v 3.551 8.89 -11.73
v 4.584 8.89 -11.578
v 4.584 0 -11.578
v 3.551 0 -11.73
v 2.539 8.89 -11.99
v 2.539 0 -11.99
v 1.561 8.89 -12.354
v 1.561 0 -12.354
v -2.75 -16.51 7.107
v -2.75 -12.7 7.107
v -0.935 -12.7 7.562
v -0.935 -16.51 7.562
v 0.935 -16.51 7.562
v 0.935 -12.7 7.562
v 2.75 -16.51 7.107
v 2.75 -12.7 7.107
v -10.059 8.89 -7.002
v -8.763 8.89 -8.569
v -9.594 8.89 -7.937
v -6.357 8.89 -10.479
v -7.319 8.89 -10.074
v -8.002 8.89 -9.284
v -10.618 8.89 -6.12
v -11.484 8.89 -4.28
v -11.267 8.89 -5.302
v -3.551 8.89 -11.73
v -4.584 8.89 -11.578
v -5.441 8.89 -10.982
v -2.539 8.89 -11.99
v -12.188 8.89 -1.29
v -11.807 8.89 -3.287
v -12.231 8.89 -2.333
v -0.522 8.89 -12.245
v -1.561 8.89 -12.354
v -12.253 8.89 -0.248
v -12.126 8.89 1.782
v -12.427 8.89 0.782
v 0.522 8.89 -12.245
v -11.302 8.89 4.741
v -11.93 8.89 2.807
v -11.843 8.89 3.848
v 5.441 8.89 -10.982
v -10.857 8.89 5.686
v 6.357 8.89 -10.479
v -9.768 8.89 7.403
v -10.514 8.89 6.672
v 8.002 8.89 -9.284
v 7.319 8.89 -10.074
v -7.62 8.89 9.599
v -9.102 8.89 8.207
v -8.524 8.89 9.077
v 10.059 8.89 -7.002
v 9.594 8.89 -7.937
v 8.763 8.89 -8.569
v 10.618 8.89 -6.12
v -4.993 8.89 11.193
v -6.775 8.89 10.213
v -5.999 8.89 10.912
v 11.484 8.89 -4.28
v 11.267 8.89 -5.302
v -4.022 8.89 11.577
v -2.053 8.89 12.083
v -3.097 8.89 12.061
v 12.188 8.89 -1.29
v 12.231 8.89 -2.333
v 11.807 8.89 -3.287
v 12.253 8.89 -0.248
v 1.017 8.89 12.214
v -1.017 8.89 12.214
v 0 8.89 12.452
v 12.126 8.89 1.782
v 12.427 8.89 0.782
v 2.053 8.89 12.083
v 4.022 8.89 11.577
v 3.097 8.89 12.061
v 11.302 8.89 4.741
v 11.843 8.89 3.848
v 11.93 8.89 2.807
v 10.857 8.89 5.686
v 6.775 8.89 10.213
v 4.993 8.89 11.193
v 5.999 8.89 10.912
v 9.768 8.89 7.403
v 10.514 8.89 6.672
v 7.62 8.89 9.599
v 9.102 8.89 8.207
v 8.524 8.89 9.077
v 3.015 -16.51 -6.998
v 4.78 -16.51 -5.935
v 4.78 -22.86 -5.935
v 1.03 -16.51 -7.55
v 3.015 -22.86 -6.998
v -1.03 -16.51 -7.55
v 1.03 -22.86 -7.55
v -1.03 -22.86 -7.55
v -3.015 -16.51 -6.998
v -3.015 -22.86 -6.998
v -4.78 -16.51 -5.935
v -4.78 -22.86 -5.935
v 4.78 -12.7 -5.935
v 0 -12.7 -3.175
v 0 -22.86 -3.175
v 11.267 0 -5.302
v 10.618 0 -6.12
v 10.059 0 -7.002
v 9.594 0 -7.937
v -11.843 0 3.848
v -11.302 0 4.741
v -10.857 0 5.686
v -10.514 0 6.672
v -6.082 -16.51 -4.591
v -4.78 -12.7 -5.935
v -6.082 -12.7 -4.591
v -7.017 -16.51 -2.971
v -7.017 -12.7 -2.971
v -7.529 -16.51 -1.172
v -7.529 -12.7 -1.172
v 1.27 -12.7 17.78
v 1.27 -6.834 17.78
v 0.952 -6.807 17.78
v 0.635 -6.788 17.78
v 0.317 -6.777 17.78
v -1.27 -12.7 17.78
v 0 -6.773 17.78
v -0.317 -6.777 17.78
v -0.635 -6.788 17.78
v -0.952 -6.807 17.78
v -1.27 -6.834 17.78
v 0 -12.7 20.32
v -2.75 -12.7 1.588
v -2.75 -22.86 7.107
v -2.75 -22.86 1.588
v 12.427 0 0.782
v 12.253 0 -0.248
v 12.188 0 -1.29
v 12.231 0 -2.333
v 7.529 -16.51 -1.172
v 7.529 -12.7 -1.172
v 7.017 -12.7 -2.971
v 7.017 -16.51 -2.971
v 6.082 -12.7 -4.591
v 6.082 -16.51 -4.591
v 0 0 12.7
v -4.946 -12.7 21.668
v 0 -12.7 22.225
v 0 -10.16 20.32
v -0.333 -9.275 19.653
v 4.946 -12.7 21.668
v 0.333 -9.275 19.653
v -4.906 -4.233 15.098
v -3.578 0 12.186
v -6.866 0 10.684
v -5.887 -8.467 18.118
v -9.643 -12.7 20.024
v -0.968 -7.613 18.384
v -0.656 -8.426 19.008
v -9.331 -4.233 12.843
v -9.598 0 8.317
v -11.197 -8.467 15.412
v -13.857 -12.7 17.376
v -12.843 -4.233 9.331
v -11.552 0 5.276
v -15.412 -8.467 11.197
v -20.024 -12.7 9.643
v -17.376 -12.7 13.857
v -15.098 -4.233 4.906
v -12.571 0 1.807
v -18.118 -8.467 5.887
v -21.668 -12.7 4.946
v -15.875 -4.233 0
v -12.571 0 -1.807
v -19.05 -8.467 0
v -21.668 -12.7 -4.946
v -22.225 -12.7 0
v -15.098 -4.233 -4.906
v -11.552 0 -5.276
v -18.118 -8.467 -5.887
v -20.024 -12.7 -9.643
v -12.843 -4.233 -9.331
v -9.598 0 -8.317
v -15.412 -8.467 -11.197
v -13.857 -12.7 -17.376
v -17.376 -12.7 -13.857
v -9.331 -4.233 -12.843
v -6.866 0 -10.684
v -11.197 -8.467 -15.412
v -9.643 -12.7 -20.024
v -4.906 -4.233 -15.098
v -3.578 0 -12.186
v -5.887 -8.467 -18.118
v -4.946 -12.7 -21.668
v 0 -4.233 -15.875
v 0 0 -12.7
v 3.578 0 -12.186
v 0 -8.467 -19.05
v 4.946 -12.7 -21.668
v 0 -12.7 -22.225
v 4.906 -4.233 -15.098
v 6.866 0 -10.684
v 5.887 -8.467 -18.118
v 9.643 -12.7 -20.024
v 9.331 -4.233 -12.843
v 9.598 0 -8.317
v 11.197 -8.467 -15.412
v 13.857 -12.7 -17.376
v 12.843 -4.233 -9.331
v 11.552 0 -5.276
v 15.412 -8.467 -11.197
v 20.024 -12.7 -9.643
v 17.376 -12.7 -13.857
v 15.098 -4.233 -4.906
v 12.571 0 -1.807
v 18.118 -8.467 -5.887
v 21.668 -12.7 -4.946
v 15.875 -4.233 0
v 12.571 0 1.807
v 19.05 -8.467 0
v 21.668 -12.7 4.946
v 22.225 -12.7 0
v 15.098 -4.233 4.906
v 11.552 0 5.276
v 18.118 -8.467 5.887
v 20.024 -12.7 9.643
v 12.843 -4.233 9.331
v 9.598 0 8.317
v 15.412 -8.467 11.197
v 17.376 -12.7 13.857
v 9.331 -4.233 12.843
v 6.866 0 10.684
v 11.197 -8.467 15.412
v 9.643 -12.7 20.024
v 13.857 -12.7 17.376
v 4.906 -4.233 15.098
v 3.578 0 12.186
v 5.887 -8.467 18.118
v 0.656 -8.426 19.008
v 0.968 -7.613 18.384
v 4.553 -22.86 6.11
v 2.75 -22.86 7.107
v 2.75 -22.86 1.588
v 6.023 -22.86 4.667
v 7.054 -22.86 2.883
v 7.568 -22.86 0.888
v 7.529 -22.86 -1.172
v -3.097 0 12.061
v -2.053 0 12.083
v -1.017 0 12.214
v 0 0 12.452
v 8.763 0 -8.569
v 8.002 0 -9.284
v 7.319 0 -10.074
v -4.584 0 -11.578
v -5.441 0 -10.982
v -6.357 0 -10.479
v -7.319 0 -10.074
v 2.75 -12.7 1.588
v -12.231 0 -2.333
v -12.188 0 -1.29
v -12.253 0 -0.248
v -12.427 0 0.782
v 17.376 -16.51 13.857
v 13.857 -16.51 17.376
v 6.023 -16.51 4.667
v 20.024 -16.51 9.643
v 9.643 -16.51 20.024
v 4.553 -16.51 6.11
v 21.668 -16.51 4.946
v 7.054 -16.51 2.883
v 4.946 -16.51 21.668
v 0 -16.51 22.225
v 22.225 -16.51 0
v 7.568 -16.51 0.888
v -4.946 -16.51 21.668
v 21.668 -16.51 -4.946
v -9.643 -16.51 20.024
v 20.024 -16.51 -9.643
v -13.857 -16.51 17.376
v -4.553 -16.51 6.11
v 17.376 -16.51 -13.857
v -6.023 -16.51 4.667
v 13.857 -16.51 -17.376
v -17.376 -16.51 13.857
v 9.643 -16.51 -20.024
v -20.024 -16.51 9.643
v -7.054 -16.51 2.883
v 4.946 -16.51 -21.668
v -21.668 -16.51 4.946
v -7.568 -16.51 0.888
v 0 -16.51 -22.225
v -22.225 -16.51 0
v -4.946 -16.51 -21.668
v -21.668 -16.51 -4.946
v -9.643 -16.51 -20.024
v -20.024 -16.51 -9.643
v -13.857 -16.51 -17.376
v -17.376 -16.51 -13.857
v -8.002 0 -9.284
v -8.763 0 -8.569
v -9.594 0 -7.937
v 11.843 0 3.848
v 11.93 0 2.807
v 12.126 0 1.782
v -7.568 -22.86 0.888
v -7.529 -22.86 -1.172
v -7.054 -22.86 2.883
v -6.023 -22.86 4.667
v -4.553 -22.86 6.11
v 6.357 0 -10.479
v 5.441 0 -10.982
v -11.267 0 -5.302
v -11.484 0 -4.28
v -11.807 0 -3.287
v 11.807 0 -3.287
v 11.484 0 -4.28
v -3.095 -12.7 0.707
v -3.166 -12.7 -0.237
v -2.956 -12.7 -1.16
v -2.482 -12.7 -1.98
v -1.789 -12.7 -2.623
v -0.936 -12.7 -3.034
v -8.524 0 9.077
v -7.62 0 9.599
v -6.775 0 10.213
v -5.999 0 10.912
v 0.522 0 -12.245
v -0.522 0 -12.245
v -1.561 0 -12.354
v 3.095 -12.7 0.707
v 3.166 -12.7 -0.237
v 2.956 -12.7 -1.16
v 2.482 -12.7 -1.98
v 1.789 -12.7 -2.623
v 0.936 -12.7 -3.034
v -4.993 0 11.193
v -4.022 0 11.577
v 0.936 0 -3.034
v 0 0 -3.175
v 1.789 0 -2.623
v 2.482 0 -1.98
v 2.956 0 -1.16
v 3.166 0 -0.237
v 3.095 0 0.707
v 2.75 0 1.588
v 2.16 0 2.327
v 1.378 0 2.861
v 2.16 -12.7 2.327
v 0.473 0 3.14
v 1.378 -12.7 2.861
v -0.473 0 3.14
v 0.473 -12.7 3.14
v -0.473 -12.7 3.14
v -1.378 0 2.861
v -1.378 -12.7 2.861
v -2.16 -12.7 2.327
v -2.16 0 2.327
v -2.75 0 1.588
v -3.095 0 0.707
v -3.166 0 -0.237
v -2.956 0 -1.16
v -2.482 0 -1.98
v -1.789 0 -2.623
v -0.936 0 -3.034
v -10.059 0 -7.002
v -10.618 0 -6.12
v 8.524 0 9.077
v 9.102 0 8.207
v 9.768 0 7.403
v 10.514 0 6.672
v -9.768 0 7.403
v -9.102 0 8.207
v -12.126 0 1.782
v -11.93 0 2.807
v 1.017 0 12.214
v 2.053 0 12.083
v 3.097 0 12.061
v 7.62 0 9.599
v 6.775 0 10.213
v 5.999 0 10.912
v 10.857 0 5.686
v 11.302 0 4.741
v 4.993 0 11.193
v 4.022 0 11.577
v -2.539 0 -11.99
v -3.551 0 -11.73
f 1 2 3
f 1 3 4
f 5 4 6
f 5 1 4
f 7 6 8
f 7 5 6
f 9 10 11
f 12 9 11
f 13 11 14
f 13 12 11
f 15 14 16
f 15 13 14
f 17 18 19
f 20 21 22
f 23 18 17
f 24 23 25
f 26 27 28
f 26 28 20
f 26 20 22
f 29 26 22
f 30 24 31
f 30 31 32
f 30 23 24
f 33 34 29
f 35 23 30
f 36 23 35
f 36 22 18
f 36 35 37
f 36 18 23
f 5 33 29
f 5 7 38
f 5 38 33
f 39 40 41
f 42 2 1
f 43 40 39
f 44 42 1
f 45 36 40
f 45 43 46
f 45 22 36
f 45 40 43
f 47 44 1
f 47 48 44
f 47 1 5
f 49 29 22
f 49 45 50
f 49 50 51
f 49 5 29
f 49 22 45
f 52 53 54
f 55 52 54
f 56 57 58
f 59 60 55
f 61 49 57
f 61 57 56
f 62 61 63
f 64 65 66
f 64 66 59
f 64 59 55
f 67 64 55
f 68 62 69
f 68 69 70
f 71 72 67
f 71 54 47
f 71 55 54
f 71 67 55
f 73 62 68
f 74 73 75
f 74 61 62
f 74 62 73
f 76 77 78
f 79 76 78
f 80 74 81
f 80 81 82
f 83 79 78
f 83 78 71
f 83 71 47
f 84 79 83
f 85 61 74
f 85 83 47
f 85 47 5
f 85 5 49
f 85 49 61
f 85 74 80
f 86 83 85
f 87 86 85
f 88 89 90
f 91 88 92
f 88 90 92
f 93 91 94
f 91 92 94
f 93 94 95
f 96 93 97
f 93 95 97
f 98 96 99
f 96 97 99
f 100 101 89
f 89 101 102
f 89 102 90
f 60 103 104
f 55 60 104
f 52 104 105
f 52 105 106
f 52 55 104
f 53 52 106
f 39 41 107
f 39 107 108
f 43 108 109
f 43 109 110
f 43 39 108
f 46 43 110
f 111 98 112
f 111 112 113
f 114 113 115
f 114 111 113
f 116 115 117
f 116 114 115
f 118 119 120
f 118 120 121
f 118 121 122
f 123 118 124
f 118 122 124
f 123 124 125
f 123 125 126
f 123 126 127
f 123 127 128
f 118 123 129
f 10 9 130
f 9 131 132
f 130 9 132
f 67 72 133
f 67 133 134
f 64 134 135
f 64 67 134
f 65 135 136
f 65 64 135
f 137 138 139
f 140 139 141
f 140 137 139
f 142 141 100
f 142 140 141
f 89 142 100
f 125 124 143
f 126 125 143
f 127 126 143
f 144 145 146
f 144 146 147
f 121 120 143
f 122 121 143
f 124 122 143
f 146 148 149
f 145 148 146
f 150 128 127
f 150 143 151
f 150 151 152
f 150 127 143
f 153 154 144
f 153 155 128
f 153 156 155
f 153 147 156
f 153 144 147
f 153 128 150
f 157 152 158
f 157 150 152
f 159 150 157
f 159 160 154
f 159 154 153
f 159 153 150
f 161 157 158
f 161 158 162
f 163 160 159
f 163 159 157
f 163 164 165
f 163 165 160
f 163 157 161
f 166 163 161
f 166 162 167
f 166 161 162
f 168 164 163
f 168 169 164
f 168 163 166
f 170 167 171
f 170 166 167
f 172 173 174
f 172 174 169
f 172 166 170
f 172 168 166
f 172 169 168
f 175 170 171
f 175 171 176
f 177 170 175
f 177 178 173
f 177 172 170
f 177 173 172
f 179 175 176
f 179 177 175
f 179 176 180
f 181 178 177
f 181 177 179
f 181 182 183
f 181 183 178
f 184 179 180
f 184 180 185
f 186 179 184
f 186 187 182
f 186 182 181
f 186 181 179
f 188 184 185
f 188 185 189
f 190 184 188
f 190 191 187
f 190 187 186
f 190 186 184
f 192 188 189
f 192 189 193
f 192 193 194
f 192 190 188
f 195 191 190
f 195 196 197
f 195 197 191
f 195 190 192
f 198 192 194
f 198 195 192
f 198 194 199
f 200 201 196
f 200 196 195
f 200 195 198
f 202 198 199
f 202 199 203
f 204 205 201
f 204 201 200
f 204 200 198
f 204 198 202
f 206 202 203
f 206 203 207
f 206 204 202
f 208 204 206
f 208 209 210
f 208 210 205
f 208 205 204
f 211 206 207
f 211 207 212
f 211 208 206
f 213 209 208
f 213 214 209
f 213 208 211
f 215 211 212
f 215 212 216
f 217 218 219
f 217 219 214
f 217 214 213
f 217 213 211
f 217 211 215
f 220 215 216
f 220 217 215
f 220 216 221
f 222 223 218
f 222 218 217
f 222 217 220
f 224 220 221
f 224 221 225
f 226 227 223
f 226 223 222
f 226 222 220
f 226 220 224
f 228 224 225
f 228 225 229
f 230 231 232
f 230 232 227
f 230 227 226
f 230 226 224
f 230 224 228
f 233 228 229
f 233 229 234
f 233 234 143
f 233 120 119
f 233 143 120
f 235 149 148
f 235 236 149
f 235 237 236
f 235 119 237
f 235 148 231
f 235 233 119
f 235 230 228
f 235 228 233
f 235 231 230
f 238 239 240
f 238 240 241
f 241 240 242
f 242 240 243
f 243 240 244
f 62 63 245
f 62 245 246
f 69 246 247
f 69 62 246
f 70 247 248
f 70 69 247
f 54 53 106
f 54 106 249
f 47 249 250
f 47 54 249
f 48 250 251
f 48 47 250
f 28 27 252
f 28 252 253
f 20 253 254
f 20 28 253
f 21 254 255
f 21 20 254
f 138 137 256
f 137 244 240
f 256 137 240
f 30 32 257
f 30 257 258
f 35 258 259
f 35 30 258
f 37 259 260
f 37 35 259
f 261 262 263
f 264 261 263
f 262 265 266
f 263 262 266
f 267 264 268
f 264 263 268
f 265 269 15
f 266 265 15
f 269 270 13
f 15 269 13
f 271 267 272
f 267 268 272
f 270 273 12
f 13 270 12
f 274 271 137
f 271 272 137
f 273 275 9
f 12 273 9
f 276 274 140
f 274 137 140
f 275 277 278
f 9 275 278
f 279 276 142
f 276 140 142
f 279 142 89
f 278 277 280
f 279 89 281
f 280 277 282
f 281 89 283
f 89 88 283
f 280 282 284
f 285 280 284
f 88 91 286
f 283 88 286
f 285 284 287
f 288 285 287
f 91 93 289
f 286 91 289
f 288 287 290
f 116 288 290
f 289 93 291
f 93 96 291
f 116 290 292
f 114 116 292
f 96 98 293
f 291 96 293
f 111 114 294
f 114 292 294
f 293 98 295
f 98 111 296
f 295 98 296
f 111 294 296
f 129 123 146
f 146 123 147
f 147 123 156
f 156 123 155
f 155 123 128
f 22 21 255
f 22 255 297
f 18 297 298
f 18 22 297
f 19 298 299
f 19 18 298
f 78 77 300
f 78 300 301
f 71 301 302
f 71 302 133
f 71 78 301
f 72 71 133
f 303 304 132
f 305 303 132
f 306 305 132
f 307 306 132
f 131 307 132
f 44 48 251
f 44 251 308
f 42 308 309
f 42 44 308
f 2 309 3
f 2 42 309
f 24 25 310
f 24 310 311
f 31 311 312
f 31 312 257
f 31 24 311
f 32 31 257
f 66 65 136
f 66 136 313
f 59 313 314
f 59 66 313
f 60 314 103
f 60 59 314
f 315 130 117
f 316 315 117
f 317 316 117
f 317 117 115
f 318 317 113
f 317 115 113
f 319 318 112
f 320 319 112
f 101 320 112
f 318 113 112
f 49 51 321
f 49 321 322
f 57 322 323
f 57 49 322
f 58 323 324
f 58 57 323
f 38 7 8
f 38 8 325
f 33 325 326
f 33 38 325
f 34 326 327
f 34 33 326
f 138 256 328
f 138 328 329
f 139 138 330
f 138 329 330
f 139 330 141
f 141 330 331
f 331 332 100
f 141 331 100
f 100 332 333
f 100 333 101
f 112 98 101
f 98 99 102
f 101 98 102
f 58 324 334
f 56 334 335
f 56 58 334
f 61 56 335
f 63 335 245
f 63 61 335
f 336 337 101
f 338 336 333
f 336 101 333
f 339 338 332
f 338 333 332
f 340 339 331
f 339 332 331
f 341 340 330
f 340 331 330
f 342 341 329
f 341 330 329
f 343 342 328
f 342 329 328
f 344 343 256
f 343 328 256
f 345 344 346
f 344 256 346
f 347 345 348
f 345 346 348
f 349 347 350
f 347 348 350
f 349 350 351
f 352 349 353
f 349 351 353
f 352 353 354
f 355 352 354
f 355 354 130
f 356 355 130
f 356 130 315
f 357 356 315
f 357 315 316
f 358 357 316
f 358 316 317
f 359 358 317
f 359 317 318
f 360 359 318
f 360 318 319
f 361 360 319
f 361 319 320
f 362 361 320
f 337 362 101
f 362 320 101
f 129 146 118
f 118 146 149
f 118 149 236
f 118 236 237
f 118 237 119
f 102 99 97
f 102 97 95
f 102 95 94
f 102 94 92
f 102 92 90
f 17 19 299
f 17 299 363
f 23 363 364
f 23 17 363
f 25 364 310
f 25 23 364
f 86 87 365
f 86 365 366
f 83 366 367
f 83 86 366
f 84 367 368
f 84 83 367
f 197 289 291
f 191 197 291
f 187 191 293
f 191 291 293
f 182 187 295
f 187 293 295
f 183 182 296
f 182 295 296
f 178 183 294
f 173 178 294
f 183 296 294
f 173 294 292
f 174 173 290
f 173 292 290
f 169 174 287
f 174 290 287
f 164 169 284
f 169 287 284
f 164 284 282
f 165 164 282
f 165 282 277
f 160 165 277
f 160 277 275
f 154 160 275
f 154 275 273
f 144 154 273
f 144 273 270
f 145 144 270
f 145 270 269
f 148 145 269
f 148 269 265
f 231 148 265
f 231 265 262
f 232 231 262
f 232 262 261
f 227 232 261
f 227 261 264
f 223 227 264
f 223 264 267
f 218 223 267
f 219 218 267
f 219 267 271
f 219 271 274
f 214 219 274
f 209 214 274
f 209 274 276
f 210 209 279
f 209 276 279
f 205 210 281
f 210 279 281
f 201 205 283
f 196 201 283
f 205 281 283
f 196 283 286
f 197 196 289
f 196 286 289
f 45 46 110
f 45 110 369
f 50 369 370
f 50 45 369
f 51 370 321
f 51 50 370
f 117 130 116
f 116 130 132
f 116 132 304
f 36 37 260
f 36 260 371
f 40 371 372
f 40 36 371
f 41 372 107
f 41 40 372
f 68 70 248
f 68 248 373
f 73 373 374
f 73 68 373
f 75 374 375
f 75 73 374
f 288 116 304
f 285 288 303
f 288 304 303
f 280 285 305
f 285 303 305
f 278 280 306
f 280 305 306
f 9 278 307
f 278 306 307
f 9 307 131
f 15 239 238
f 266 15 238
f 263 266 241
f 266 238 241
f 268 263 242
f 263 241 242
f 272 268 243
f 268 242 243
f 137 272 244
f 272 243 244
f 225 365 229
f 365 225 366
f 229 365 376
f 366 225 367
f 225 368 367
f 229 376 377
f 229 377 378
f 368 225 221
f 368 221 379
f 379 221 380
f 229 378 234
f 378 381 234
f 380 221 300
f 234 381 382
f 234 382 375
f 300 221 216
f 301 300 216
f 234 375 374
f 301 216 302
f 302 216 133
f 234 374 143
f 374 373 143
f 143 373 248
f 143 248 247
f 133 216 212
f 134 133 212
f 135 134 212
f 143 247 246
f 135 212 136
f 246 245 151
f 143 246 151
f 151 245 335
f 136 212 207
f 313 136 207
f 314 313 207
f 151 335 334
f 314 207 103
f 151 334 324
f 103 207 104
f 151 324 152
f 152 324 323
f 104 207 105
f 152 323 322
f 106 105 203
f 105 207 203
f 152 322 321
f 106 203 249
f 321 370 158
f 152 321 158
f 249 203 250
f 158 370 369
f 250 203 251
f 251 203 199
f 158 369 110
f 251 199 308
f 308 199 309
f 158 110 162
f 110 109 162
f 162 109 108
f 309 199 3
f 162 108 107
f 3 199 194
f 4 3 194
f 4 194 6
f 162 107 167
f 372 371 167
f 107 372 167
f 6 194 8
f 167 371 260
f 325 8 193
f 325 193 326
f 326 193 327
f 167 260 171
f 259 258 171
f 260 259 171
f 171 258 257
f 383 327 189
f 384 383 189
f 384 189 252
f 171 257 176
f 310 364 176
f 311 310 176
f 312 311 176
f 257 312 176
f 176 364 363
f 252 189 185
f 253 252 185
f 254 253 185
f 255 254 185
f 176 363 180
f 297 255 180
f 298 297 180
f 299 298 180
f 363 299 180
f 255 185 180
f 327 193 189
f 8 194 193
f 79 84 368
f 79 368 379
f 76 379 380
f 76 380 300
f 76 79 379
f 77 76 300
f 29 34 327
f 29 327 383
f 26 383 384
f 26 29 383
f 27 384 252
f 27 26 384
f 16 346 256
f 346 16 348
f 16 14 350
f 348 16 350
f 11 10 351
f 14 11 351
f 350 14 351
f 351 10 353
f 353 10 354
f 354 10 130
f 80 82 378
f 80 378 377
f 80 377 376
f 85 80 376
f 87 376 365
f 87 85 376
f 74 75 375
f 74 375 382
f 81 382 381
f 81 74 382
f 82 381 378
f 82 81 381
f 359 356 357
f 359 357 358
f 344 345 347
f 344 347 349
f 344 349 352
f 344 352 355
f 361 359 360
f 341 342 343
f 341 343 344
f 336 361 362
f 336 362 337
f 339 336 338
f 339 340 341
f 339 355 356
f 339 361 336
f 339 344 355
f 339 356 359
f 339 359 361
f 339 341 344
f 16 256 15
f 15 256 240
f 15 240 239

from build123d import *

# Parameters (mm, degrees)
SKETCH1_R                = 12.7
BOSS_EXTRUDE1_DEPTH      = 8.89
SKETCH2_R                = 22.225
BOSS_EXTRUDE3_DEPTH      = 3.81
SKETCH4_R                = 7.62
CUT_EXTRUDE2_DEPTH       = 3.81
BOSS_EXTRUDE4_DEPTH      = 3.81
BOSS_EXTRUDE4_DEPTH_BACK = 6.35
SKETCH7_R                = 3.175
CUT_EXTRUDE3_DEPTH       = 12.7
CUT_EXTRUDE4_DEPTH       = 12.7
CUT_EXTRUDE_THIN2_DEPTH  = 8.89


with BuildPart() as part:
    # Sketch1 → Boss-Extrude1 (new body)
    with BuildSketch(Plane(origin=(0, 0, 0), x_dir=(1, 0, 0), z_dir=(0, 1, 0))):
        with Locations(Location((0, 0, 0), (0, 0, 270))):
            Circle(SKETCH1_R)
    extrude(amount=BOSS_EXTRUDE1_DEPTH)



with BuildPart() as body_2:
    # Sketch2 → Boss-Extrude3 (new body)
    with BuildSketch(Plane(origin=(0, -16.51, 0), x_dir=(1, 0, 0), z_dir=(0, 1, 0))):
        with Locations(Location((0, 0, 0), (0, 0, 90))):
            Circle(SKETCH2_R)
    extrude(amount=BOSS_EXTRUDE3_DEPTH)


with BuildPart() as part_1:
    add(part.part)

    add(body_2.part)  # loft2 joins it to this body
    # loft up to a face of the part (loft2)
    loft([Face(Wire([part_1.edges().sort_by_distance((-9.257901568, 0, -8.693748245))[0]])), Face(Wire([part_1.edges().sort_by_distance((-16.201327744, -12.7, 15.214059429))[0]]))])

    # Sketch4 → Cut-Extrude2 (cut)
    with BuildSketch(Plane(origin=(0, -16.51, 0), x_dir=(1, 0, 0), z_dir=(0, 1, 0))):
        with Locations(Location((0, 0, 0), (0, 0, 90))):
            Circle(SKETCH4_R)
    extrude(amount=CUT_EXTRUDE2_DEPTH, mode=Mode.SUBTRACT)

    # Sketch3 → Boss-Extrude4 (add, two sides: drawn at the far end of the back side and taken through both)
    with BuildSketch(Plane(origin=(0, -16.51, 0), x_dir=(1, 0, 0), z_dir=(0, 1, 0)).offset(-BOSS_EXTRUDE4_DEPTH_BACK)):
        with BuildLine():
            Line((0, 3.175), (4.779691024, 5.934555899))
            ThreePointArc((4.779691024, 5.934555899), (0, 7.62), (-4.779691024, 5.934555899))
            Line((-4.779691024, 5.934555899), (0, 3.175))
        make_face()
        with BuildLine():
            Line((2.749630657, -1.5875), (2.749630657, -7.106611798))
            ThreePointArc((2.749630657, -7.106611798), (6.599113577, -3.81), (7.529321681, 1.172055899))
            Line((7.529321681, 1.172055899), (2.749630657, -1.5875))
        make_face()
        with BuildLine():
            Line((-2.749630657, -1.5875), (-7.529321681, 1.172055899))
            ThreePointArc((-7.529321681, 1.172055899), (-6.599113577, -3.81), (-2.749630657, -7.106611798))
            Line((-2.749630657, -7.106611798), (-2.749630657, -1.5875))
        make_face()
    extrude(amount=BOSS_EXTRUDE4_DEPTH + BOSS_EXTRUDE4_DEPTH_BACK)

    # Sketch7 → Cut-Extrude3 (cut)
    with BuildSketch(Plane.XZ.offset(12.7)):
        with Locations(Location((0, 0, 0), (0, 0, 270))):
            Circle(SKETCH7_R)
    extrude(amount=-CUT_EXTRUDE3_DEPTH, mode=Mode.SUBTRACT)

    # Sketch9 → Cut-Extrude4 (cut)
    with BuildSketch(Plane(origin=(0, 0, 0), x_dir=(1, 0, 0), z_dir=(0, 1, 0))):
        Polygon((0, -20.32), (1.27, -17.78), (-1.27, -17.78), align=None)
    extrude(amount=-CUT_EXTRUDE4_DEPTH, mode=Mode.SUBTRACT)

    # Sketch10 → Cut-Extrude-Thin2 (cut)
    with BuildSketch(Plane(origin=(0, 8.89, 0), x_dir=(1, 0, 0), z_dir=(0, 1, 0))):
        with BuildLine():
            ThreePointArc((2.277411846, 12.494134435), (0, 12.231184444), (-2.277411846, 12.494134435))
            Line((-2.277411846, 12.494134435), (-1.698591269, 14.967303806))
            ThreePointArc((-1.698591269, 14.967303806), (0, 14.771184444), (1.698591269, 14.967303806))
            Line((1.698591269, 14.967303806), (2.277411846, 12.494134435))
        make_face()
        with BuildLine():
            ThreePointArc((5.313027648, 11.535238932), (3.041771879, 11.846919293), (0.901302118, 12.667977522))
            Line((0.901302118, 12.667977522), (2.076990194, 14.919500905))
            ThreePointArc((2.076990194, 14.919500905), (3.673444193, 14.307120523), (5.367443996, 14.074655963))
            Line((5.367443996, 14.074655963), (5.313027648, 11.535238932))
        make_face()
        with BuildLine():
            ThreePointArc((8.014806383, 9.851541942), (5.892418045, 10.718268633), (4.023383955, 12.045844991))
            Line((4.023383955, 12.045844991), (5.722066724, 13.934250892))
            ThreePointArc((5.722066724, 13.934250892), (7.116072377, 12.944087601), (8.699040476, 12.297645723))
            Line((8.699040476, 12.297645723), (8.014806383, 9.851541942))
        make_face()
        with BuildLine():
            ThreePointArc((10.212985356, 7.548836342), (8.372821913, 8.916149736), (6.892661781, 10.666827718))
            Line((6.892661781, 10.666827718), (9.007604758, 12.073460649))
            ThreePointArc((9.007604758, 12.073460649), (10.111571563, 10.76773005), (11.48404425, 9.747929175))
            Line((11.48404425, 9.747929175), (10.212985356, 7.548836342))
        make_face()
        with BuildLine():
            ThreePointArc((11.769444899, 4.771809591), (10.327130588, 6.55379636), (9.328848318, 8.61757443))
            Line((9.328848318, 8.61757443), (11.727161858, 9.454050471))
            ThreePointArc((11.727161858, 9.454050471), (12.471723519, 7.914796419), (13.547463289, 6.585714386))
            Line((13.547463289, 6.585714386), (11.769444899, 4.771809591))
        make_face()
        with BuildLine():
            ThreePointArc((12.586386934, 1.694952494), (11.632547668, 3.779643855), (11.178869006, 6.026847247))
            Line((11.178869006, 6.026847247), (13.709858248, 6.240607531))
            ThreePointArc((13.709858248, 6.240607531), (14.048231219, 4.56454702), (14.759645385, 3.009694941))
            Line((14.759645385, 3.009694941), (12.586386934, 1.694952494))
        make_face()
        with BuildLine():
            ThreePointArc((12.612479988, -1.488404702), (12.207048996, 0.768002426), (12.326480242, 3.057431087))
            Line((12.326480242, 3.057431087), (14.831113823, 2.635044269))
            ThreePointArc((14.831113823, 2.635044269), (14.742036886, 0.927490345), (15.04442468, -0.755434705))
            Line((15.04442468, -0.755434705), (12.612479988, -1.488404702))
        make_face()
        with BuildLine():
            ThreePointArc((11.846084539, -4.578239956), (12.014536541, -2.29189542), (12.69957339, -0.104094714))
            Line((12.69957339, -0.104094714), (15.020475972, -1.136088515))
            ThreePointArc((15.020475972, -1.136088515), (14.509546158, -2.767843959), (14.383907442, -4.473097611))
            Line((14.383907442, -4.473097611), (11.846084539, -4.578239956))
        make_face()
        with BuildLine():
            ThreePointArc((10.335356031, -7.380407557), (11.067106569, -5.207785048), (12.274705637, -3.25907986))
            Line((12.274705637, -3.25907986), (14.266046374, -4.83583668))
            ThreePointArc((14.266046374, -4.83583668), (13.365367282, -6.289264448), (12.819596399, -7.909699343))
            Line((12.819596399, -7.909699343), (10.335356031, -7.380407557))
        make_face()
        with BuildLine():
            ThreePointArc((8.175219094, -9.718837007), (9.424289589, -7.796450388), (11.078572985, -6.209285033))
            Line((11.078572985, -6.209285033), (12.615228615, -8.231731441))
            ThreePointArc((12.615228615, -8.231731441), (11.381393226, -9.415507322), (10.449782968, -10.849305575))
            Line((10.449782968, -10.849305575), (8.175219094, -9.718837007))
        make_face()
        with BuildLine():
            ThreePointArc((5.501403074, -11.446596185), (7.189309834, -9.895236077), (9.186332848, -8.769337991))
            Line((9.186332848, -8.769337991), (10.171749647, -11.110396242))
            ThreePointArc((10.171749647, -11.110396242), (8.682284375, -11.950139243), (7.423371241, -13.107210037))
            Line((7.423371241, -13.107210037), (5.501403074, -11.446596185))
        make_face()
        with BuildLine():
            ThreePointArc((2.481913667, -12.455123626), (4.502599302, -11.372267691), (6.716881634, -10.778381192))
            Line((6.716881634, -10.778381192), (7.08914224, -13.290953985))
            ThreePointArc((7.08914224, -13.290953985), (5.437635666, -13.733899965), (3.930521798, -14.541540287))
            Line((3.930521798, -14.541540287), (2.481913667, -12.455123626))
        make_face()
        with BuildLine():
            ThreePointArc((-0.693523504, -12.681049844), (1.532973897, -12.134737902), (3.825384043, -12.110179062))
            Line((3.825384043, -12.110179062), (3.561097953, -14.636392209))
            ThreePointArc((3.561097953, -14.636392209), (1.85132031, -14.654709243), (0.190703214, -15.062172082))
            Line((0.190703214, -15.062172082), (-0.693523504, -12.681049844))
        make_face()
        with BuildLine():
            ThreePointArc((-3.825384043, -12.110179062), (-1.532973897, -12.134737902), (0.693523504, -12.681049844))
            Line((0.693523504, -12.681049844), (-0.190703214, -15.062172082))
            ThreePointArc((-0.190703214, -15.062172082), (-1.85132031, -14.654709243), (-3.561097953, -14.636392209))
            Line((-3.561097953, -14.636392209), (-3.825384043, -12.110179062))
        make_face()
        with BuildLine():
            ThreePointArc((-6.716881634, -10.778381192), (-4.502599302, -11.372267691), (-2.481913667, -12.455123626))
            Line((-2.481913667, -12.455123626), (-3.930521798, -14.541540287))
            ThreePointArc((-3.930521798, -14.541540287), (-5.437635666, -13.733899965), (-7.08914224, -13.290953985))
            Line((-7.08914224, -13.290953985), (-6.716881634, -10.778381192))
        make_face()
        with BuildLine():
            ThreePointArc((-9.186332848, -8.769337991), (-7.189309834, -9.895236077), (-5.501403074, -11.446596185))
            Line((-5.501403074, -11.446596185), (-7.423371241, -13.107210037))
            ThreePointArc((-7.423371241, -13.107210037), (-8.682284375, -11.950139243), (-10.171749647, -11.110396242))
            Line((-10.171749647, -11.110396242), (-9.186332848, -8.769337991))
        make_face()
        with BuildLine():
            ThreePointArc((-11.078572985, -6.209285033), (-9.424289589, -7.796450388), (-8.175219094, -9.718837007))
            Line((-8.175219094, -9.718837007), (-10.449782968, -10.849305575))
            ThreePointArc((-10.449782968, -10.849305575), (-11.381393226, -9.415507322), (-12.615228615, -8.231731441))
            Line((-12.615228615, -8.231731441), (-11.078572985, -6.209285033))
        make_face()
        with BuildLine():
            ThreePointArc((-12.274705637, -3.25907986), (-11.067106569, -5.207785048), (-10.335356031, -7.380407557))
            Line((-10.335356031, -7.380407557), (-12.819596399, -7.909699343))
            ThreePointArc((-12.819596399, -7.909699343), (-13.365367282, -6.289264448), (-14.266046374, -4.83583668))
            Line((-14.266046374, -4.83583668), (-12.274705637, -3.25907986))
        make_face()
        with BuildLine():
            ThreePointArc((-12.69957339, -0.104094714), (-12.014536541, -2.29189542), (-11.846084539, -4.578239956))
            Line((-11.846084539, -4.578239956), (-14.383907442, -4.473097611))
            ThreePointArc((-14.383907442, -4.473097611), (-14.509546158, -2.767843959), (-15.020475972, -1.136088515))
            Line((-15.020475972, -1.136088515), (-12.69957339, -0.104094714))
        make_face()
        with BuildLine():
            ThreePointArc((-12.326480242, 3.057431087), (-12.207048996, 0.768002426), (-12.612479988, -1.488404702))
            Line((-12.612479988, -1.488404702), (-15.04442468, -0.755434705))
            ThreePointArc((-15.04442468, -0.755434705), (-14.742036886, 0.927490345), (-14.831113823, 2.635044269))
            Line((-14.831113823, 2.635044269), (-12.326480242, 3.057431087))
        make_face()
        with BuildLine():
            ThreePointArc((-11.178869006, 6.026847247), (-11.632547668, 3.779643855), (-12.586386934, 1.694952494))
            Line((-12.586386934, 1.694952494), (-14.759645385, 3.009694941))
            ThreePointArc((-14.759645385, 3.009694941), (-14.048231219, 4.56454702), (-13.709858248, 6.240607531))
            Line((-13.709858248, 6.240607531), (-11.178869006, 6.026847247))
        make_face()
        with BuildLine():
            ThreePointArc((-9.328848318, 8.61757443), (-10.327130588, 6.55379636), (-11.769444899, 4.771809591))
            Line((-11.769444899, 4.771809591), (-13.547463289, 6.585714386))
            ThreePointArc((-13.547463289, 6.585714386), (-12.471723519, 7.914796419), (-11.727161858, 9.454050471))
            Line((-11.727161858, 9.454050471), (-9.328848318, 8.61757443))
        make_face()
        with BuildLine():
            ThreePointArc((-6.892661781, 10.666827718), (-8.372821913, 8.916149736), (-10.212985356, 7.548836342))
            Line((-10.212985356, 7.548836342), (-11.48404425, 9.747929175))
            ThreePointArc((-11.48404425, 9.747929175), (-10.111571563, 10.76773005), (-9.007604758, 12.073460649))
            Line((-9.007604758, 12.073460649), (-6.892661781, 10.666827718))
        make_face()
        with BuildLine():
            ThreePointArc((-4.023383955, 12.045844991), (-5.892418045, 10.718268633), (-8.014806383, 9.851541942))
            Line((-8.014806383, 9.851541942), (-8.699040476, 12.297645723))
            ThreePointArc((-8.699040476, 12.297645723), (-7.116072377, 12.944087601), (-5.722066724, 13.934250892))
            Line((-5.722066724, 13.934250892), (-4.023383955, 12.045844991))
        make_face()
        with BuildLine():
            ThreePointArc((-0.901302118, 12.667977522), (-3.041771879, 11.846919293), (-5.313027648, 11.535238932))
            Line((-5.313027648, 11.535238932), (-5.367443996, 14.074655963))
            ThreePointArc((-5.367443996, 14.074655963), (-3.673444193, 14.307120523), (-2.076990194, 14.919500905))
            Line((-2.076990194, 14.919500905), (-0.901302118, 12.667977522))
        make_face()
    extrude(amount=-CUT_EXTRUDE_THIN2_DEPTH, mode=Mode.SUBTRACT)


solid = part_1.part
